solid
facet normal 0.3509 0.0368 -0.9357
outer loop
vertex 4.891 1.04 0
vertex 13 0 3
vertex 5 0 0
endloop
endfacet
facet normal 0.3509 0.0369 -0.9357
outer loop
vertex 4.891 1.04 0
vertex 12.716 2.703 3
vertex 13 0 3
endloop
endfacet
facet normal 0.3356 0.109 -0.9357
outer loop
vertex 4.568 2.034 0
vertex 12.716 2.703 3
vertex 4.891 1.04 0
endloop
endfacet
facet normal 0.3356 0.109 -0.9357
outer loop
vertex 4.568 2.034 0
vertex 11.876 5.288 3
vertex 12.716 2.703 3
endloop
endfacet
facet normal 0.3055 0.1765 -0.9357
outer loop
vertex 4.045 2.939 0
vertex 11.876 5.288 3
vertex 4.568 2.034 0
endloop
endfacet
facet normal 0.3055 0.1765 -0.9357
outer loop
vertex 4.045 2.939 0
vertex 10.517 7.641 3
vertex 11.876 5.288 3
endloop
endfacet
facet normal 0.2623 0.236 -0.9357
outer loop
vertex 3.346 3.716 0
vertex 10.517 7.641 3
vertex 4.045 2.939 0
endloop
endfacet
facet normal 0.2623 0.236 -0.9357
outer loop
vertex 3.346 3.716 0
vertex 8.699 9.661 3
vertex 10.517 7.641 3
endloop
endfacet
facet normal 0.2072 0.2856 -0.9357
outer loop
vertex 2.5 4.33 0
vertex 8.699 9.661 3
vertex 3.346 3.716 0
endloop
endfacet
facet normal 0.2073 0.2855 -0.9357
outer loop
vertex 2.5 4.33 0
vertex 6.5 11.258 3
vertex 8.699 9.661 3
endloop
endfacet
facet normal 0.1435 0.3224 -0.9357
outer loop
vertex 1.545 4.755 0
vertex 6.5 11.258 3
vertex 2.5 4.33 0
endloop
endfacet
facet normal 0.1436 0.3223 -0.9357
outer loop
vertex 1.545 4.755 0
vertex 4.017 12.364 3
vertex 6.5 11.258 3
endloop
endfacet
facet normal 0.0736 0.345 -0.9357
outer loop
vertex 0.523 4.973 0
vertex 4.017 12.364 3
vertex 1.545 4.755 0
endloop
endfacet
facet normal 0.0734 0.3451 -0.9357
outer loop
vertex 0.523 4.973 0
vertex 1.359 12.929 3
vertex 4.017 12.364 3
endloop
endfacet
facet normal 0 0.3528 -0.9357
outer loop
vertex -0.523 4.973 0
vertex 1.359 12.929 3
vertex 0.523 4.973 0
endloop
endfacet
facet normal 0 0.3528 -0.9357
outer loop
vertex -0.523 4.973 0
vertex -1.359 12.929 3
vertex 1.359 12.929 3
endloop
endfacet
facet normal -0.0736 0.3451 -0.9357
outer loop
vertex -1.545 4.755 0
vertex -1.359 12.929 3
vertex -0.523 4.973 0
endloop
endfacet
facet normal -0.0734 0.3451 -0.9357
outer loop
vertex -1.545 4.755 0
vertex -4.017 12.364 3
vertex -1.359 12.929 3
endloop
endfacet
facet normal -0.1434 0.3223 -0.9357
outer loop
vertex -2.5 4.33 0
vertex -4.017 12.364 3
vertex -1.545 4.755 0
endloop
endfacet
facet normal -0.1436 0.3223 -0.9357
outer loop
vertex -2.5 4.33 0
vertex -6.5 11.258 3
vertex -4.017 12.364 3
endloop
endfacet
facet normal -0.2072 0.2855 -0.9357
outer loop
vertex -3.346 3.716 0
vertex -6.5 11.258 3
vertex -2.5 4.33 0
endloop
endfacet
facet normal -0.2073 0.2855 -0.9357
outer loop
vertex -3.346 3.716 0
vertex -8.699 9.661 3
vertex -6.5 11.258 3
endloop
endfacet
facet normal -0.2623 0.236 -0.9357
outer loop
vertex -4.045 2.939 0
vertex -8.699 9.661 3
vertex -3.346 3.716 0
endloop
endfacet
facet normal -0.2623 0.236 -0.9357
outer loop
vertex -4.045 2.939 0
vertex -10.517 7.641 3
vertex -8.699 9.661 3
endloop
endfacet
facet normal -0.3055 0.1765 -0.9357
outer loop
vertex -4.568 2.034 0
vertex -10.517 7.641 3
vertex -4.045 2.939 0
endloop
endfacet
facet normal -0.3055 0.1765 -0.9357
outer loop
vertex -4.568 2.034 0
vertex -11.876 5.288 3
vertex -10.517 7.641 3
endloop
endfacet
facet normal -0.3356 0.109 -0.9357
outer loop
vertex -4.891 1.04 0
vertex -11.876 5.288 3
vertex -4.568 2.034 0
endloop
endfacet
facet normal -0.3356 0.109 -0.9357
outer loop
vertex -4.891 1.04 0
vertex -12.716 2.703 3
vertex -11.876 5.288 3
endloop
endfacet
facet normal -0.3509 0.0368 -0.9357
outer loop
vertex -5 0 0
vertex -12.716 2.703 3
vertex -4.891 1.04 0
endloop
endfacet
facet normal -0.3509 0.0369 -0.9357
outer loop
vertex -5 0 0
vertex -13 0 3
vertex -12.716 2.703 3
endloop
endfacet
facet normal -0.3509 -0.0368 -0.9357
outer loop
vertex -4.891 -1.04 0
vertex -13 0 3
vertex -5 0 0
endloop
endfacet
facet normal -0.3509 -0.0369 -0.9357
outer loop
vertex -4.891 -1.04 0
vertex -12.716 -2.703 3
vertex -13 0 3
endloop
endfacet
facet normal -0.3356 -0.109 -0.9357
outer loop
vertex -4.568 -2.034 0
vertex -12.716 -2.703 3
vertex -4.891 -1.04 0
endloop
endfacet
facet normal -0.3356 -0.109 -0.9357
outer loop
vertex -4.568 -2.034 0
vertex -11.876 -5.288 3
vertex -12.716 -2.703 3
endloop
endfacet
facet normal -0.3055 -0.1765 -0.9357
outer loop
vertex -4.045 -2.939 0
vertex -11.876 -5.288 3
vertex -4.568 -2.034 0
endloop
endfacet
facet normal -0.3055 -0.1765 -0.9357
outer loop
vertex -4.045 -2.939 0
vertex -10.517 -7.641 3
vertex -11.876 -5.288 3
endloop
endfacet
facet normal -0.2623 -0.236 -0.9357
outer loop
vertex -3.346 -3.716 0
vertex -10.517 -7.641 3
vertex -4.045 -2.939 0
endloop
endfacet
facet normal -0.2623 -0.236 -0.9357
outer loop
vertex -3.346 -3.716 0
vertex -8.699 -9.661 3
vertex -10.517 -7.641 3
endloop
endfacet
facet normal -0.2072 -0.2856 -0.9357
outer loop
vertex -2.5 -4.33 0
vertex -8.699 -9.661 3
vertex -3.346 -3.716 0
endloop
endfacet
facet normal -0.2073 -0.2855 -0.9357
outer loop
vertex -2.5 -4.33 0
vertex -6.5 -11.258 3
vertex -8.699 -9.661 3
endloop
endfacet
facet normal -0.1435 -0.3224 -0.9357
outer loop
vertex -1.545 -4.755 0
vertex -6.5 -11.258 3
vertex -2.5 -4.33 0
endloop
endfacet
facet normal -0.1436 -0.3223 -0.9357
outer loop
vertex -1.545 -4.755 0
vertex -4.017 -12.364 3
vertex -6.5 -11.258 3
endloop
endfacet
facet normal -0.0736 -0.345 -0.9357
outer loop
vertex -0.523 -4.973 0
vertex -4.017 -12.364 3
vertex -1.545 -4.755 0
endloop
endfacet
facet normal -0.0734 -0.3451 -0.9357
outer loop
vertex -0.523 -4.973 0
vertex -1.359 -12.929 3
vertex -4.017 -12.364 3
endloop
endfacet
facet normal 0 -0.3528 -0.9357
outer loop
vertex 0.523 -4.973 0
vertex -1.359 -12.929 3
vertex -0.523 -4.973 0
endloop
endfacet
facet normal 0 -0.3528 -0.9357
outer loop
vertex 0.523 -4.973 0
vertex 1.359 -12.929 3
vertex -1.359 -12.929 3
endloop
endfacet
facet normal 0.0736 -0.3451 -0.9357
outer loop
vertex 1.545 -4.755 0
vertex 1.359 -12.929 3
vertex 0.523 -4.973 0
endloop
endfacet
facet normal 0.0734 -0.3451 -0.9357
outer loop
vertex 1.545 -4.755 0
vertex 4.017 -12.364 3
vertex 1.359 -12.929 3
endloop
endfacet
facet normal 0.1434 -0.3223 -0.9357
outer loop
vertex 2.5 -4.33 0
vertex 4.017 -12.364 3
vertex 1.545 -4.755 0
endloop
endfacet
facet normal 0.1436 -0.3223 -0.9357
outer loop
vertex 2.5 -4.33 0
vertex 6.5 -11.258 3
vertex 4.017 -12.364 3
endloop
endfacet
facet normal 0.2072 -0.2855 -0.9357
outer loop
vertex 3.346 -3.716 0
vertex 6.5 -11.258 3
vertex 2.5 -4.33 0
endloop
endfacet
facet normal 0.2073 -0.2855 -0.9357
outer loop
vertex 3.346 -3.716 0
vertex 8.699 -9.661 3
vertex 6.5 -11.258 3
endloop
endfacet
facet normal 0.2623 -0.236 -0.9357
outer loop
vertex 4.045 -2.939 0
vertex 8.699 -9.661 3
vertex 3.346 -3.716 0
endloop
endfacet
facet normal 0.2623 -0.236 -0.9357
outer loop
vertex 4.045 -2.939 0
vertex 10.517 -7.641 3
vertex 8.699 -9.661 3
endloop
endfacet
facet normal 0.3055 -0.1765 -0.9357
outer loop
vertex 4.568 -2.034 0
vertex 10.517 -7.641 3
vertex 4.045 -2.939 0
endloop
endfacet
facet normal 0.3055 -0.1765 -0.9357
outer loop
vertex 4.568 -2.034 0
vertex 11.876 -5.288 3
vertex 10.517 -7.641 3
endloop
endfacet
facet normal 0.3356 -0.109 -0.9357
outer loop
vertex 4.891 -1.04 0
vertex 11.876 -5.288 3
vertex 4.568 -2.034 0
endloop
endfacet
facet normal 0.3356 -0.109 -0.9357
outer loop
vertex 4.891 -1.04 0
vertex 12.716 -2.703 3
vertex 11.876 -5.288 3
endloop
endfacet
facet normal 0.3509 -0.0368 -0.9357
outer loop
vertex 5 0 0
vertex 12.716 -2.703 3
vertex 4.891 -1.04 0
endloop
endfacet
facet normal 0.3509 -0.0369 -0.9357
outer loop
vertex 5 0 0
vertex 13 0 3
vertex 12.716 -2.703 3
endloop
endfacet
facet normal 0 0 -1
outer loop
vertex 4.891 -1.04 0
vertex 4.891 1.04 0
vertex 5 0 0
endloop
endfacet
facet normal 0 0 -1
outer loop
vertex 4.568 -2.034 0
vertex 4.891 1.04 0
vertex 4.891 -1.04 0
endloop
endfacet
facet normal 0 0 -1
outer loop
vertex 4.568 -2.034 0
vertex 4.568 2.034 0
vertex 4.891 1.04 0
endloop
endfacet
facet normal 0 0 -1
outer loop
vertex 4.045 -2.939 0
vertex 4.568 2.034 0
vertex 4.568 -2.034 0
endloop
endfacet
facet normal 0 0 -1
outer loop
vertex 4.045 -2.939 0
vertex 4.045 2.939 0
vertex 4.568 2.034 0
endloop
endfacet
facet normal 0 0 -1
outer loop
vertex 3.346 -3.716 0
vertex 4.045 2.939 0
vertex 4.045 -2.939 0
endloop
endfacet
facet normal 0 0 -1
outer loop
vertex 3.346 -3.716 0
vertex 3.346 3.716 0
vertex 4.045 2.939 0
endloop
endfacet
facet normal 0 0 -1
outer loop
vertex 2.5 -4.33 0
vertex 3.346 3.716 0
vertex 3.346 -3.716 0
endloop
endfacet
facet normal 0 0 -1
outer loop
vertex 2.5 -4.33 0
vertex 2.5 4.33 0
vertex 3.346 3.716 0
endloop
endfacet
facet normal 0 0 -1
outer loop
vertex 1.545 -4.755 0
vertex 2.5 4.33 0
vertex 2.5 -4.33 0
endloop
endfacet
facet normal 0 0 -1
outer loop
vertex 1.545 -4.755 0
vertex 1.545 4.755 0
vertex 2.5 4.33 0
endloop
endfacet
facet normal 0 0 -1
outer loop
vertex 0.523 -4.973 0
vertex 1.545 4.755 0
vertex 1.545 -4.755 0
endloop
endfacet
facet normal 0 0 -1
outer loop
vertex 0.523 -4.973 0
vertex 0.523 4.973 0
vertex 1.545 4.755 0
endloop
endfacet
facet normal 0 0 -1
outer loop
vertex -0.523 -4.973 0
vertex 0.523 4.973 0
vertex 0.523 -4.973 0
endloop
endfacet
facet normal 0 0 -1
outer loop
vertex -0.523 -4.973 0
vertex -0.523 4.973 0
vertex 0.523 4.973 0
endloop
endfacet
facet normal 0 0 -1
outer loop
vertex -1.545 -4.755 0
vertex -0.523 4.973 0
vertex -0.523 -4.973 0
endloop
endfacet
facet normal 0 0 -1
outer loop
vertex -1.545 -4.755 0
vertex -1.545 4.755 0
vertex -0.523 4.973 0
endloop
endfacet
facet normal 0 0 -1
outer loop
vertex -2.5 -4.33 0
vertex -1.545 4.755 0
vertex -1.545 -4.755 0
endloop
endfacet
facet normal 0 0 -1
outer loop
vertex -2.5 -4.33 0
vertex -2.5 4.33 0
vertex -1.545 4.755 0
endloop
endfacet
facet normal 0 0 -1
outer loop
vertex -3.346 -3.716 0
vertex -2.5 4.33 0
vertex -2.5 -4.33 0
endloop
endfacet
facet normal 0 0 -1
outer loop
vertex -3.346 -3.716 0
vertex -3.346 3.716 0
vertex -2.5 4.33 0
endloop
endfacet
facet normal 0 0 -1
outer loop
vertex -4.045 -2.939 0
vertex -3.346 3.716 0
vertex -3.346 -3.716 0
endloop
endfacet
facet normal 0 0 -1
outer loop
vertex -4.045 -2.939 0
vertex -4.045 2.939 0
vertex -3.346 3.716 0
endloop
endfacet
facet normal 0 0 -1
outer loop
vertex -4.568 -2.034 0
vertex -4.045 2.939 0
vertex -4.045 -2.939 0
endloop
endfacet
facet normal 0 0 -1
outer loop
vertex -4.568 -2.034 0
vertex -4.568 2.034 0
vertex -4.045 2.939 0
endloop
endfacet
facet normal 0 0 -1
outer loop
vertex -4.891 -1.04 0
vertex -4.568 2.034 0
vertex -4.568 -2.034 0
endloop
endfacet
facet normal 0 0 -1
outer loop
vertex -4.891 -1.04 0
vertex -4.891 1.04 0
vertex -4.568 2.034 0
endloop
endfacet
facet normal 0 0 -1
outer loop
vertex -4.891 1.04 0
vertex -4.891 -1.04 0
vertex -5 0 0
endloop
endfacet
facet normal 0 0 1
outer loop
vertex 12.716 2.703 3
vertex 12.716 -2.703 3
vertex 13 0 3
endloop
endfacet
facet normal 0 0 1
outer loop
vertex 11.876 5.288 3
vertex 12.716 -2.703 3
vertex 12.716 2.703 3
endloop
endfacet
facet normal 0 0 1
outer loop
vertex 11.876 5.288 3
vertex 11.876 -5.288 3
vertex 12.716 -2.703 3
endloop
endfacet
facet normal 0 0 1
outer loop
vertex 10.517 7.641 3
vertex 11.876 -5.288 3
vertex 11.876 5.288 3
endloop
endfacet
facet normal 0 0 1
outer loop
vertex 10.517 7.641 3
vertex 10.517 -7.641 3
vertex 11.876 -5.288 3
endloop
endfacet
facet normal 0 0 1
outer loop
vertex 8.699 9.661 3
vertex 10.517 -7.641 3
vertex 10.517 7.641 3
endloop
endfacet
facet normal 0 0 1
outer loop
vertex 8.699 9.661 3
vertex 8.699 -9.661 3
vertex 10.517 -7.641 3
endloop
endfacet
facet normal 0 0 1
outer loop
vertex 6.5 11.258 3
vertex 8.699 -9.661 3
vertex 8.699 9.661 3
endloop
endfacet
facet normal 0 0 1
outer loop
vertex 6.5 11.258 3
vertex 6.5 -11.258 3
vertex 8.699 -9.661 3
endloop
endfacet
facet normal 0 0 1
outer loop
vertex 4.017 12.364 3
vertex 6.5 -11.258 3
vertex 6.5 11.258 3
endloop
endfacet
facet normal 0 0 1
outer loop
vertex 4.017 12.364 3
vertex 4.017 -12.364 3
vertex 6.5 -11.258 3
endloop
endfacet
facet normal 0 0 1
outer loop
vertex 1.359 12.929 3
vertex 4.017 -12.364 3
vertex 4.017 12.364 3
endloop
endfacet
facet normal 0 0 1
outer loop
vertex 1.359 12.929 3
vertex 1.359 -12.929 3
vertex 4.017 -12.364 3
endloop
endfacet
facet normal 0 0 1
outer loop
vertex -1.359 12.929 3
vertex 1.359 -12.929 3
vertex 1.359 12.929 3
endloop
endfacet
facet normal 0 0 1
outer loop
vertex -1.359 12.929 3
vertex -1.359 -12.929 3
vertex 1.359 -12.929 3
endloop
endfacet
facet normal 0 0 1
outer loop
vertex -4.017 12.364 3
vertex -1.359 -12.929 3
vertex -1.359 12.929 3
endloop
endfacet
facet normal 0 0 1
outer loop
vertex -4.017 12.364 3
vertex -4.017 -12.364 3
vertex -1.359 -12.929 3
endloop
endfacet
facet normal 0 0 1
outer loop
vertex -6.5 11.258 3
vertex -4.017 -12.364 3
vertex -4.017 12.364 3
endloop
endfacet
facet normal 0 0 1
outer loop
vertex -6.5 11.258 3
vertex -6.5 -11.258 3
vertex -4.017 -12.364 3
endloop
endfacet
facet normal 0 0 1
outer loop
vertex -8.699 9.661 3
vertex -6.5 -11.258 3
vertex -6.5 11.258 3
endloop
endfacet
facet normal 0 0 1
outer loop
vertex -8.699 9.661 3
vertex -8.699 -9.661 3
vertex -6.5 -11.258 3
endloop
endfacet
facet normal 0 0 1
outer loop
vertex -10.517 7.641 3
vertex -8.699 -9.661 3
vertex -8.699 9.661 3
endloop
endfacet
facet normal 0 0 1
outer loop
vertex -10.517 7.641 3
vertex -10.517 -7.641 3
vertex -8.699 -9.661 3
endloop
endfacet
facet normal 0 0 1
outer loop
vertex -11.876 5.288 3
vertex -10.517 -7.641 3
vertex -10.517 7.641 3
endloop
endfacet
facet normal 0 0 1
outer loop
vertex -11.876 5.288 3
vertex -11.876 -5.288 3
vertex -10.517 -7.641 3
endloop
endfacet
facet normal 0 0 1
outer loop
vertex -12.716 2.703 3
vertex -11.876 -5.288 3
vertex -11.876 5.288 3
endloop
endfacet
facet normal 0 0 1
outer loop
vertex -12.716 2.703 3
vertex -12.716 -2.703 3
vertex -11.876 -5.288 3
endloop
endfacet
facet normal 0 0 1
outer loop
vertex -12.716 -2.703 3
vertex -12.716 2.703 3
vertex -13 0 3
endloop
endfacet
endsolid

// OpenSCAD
// Generated by SolidPython 1.0.1 on 2020-07-29 00:02:42


cylinder(h = 3, r1 = 5, r2 = 13);
/***********************************************
*********      SolidPython code:      **********
************************************************
 
# import packages: SolidPython
from solid import *
from solid.utils import *
from itertools import chain, combinations


class Resize:

    def __init__(self, scad_file):
        self.scad_file = scad_file
        #self.scad_file = import_scad(scad_file)
        # cone/cylinder param:
        self.r1 = 0
        self.r2 = 0
        self.h = 0
        # rectangular prism param:
        self.w = 0
        self.l = 0
        # ellipse param:
        self.r = 0

    # import OpenScad code (file name corresponds to shape)


    # classify shape + parameters
    def assign(self, param1, param2, param3):
        if self.scad_file == 'cone.scad':
            self.r1 = param1
            self.r2 = param2
            self.h = param3
        elif self.scad_file == 'cylinder.scad':
            self.r1 = param1
            self.r2 = param2
            self.h = param3
        elif self.scad_file == 'rectangularPrism.scad':
            self.h = param1
            self.l = param2
            self.w = param3
        else:
            self.r = param1
            self.h = param2

    # resize parameters
    def iterate(self):
        x = range(3, 20, 2)
        i = 1
        if self.scad_file == 'cone.scad':
            tempList = list(combinations(x, 3))
            #print(tempList)
            for i in x:
                for j in range (3):
                    param1 = tempList[i][0]
                    param2 = tempList[i][1]
                    param3 = tempList[i][2]
                    filepath = 'produced_scad_files/' + 'cone' + str(param1) + '_' + str(param2) + '_' + str(param3) + '.scad'
                    scad_render_to_file(cylinder(h=param1, r1=param2, r2=param3), filepath)

        elif self.scad_file == 'cylinder.scad':
            tempList = list(combinations(x, 3))
            for i in x:
                for j in range(3):
                    param1 = tempList[i][0]
                    param2 = tempList[i][1]
                    param3 = tempList[i][2]
                    filepath = 'produced_scad_files/' + 'cylinder' + str(param1) + '_' + str(param2) + '_' + str(param3) + '.scad'
                    scad_render_to_file(cylinder(h=param1, r1=param2, r2=param3), filepath)

        elif self.scad_file == 'rectangularPrism.scad':
            tempList = list(combinations(x, 3))
            for i in x:
                for j in range(3):
                    param1 = tempList[i][0]
                    param2 = tempList[i][1]
                    param3 = tempList[i][2]
                    filepath = 'produced_scad_files/' + 'rectangularPrism' + str(param1) + '_' + str(param2) + '_' + str(
                        param3) + '.scad'
                    scad_render_to_file(cube(size=(param1, param2, param3)), filepath)

        else:
            tempList = list(combinations(x, 2))
            for i in x:
                for j in range(3):
                    param1 = tempList[i][0]
                    param2 = tempList[i][1]
                    filepath = 'produced_scad_files/' + 'ellipse' + str(param1) + '_' + str(param2) + '_' + '.scad'
                    scad_render_to_file(sphere(param1, param2), filepath)

    def render_to_scadfile(self):
        scad_render_to_file(scad, 'example.scad') 
 
************************************************/
